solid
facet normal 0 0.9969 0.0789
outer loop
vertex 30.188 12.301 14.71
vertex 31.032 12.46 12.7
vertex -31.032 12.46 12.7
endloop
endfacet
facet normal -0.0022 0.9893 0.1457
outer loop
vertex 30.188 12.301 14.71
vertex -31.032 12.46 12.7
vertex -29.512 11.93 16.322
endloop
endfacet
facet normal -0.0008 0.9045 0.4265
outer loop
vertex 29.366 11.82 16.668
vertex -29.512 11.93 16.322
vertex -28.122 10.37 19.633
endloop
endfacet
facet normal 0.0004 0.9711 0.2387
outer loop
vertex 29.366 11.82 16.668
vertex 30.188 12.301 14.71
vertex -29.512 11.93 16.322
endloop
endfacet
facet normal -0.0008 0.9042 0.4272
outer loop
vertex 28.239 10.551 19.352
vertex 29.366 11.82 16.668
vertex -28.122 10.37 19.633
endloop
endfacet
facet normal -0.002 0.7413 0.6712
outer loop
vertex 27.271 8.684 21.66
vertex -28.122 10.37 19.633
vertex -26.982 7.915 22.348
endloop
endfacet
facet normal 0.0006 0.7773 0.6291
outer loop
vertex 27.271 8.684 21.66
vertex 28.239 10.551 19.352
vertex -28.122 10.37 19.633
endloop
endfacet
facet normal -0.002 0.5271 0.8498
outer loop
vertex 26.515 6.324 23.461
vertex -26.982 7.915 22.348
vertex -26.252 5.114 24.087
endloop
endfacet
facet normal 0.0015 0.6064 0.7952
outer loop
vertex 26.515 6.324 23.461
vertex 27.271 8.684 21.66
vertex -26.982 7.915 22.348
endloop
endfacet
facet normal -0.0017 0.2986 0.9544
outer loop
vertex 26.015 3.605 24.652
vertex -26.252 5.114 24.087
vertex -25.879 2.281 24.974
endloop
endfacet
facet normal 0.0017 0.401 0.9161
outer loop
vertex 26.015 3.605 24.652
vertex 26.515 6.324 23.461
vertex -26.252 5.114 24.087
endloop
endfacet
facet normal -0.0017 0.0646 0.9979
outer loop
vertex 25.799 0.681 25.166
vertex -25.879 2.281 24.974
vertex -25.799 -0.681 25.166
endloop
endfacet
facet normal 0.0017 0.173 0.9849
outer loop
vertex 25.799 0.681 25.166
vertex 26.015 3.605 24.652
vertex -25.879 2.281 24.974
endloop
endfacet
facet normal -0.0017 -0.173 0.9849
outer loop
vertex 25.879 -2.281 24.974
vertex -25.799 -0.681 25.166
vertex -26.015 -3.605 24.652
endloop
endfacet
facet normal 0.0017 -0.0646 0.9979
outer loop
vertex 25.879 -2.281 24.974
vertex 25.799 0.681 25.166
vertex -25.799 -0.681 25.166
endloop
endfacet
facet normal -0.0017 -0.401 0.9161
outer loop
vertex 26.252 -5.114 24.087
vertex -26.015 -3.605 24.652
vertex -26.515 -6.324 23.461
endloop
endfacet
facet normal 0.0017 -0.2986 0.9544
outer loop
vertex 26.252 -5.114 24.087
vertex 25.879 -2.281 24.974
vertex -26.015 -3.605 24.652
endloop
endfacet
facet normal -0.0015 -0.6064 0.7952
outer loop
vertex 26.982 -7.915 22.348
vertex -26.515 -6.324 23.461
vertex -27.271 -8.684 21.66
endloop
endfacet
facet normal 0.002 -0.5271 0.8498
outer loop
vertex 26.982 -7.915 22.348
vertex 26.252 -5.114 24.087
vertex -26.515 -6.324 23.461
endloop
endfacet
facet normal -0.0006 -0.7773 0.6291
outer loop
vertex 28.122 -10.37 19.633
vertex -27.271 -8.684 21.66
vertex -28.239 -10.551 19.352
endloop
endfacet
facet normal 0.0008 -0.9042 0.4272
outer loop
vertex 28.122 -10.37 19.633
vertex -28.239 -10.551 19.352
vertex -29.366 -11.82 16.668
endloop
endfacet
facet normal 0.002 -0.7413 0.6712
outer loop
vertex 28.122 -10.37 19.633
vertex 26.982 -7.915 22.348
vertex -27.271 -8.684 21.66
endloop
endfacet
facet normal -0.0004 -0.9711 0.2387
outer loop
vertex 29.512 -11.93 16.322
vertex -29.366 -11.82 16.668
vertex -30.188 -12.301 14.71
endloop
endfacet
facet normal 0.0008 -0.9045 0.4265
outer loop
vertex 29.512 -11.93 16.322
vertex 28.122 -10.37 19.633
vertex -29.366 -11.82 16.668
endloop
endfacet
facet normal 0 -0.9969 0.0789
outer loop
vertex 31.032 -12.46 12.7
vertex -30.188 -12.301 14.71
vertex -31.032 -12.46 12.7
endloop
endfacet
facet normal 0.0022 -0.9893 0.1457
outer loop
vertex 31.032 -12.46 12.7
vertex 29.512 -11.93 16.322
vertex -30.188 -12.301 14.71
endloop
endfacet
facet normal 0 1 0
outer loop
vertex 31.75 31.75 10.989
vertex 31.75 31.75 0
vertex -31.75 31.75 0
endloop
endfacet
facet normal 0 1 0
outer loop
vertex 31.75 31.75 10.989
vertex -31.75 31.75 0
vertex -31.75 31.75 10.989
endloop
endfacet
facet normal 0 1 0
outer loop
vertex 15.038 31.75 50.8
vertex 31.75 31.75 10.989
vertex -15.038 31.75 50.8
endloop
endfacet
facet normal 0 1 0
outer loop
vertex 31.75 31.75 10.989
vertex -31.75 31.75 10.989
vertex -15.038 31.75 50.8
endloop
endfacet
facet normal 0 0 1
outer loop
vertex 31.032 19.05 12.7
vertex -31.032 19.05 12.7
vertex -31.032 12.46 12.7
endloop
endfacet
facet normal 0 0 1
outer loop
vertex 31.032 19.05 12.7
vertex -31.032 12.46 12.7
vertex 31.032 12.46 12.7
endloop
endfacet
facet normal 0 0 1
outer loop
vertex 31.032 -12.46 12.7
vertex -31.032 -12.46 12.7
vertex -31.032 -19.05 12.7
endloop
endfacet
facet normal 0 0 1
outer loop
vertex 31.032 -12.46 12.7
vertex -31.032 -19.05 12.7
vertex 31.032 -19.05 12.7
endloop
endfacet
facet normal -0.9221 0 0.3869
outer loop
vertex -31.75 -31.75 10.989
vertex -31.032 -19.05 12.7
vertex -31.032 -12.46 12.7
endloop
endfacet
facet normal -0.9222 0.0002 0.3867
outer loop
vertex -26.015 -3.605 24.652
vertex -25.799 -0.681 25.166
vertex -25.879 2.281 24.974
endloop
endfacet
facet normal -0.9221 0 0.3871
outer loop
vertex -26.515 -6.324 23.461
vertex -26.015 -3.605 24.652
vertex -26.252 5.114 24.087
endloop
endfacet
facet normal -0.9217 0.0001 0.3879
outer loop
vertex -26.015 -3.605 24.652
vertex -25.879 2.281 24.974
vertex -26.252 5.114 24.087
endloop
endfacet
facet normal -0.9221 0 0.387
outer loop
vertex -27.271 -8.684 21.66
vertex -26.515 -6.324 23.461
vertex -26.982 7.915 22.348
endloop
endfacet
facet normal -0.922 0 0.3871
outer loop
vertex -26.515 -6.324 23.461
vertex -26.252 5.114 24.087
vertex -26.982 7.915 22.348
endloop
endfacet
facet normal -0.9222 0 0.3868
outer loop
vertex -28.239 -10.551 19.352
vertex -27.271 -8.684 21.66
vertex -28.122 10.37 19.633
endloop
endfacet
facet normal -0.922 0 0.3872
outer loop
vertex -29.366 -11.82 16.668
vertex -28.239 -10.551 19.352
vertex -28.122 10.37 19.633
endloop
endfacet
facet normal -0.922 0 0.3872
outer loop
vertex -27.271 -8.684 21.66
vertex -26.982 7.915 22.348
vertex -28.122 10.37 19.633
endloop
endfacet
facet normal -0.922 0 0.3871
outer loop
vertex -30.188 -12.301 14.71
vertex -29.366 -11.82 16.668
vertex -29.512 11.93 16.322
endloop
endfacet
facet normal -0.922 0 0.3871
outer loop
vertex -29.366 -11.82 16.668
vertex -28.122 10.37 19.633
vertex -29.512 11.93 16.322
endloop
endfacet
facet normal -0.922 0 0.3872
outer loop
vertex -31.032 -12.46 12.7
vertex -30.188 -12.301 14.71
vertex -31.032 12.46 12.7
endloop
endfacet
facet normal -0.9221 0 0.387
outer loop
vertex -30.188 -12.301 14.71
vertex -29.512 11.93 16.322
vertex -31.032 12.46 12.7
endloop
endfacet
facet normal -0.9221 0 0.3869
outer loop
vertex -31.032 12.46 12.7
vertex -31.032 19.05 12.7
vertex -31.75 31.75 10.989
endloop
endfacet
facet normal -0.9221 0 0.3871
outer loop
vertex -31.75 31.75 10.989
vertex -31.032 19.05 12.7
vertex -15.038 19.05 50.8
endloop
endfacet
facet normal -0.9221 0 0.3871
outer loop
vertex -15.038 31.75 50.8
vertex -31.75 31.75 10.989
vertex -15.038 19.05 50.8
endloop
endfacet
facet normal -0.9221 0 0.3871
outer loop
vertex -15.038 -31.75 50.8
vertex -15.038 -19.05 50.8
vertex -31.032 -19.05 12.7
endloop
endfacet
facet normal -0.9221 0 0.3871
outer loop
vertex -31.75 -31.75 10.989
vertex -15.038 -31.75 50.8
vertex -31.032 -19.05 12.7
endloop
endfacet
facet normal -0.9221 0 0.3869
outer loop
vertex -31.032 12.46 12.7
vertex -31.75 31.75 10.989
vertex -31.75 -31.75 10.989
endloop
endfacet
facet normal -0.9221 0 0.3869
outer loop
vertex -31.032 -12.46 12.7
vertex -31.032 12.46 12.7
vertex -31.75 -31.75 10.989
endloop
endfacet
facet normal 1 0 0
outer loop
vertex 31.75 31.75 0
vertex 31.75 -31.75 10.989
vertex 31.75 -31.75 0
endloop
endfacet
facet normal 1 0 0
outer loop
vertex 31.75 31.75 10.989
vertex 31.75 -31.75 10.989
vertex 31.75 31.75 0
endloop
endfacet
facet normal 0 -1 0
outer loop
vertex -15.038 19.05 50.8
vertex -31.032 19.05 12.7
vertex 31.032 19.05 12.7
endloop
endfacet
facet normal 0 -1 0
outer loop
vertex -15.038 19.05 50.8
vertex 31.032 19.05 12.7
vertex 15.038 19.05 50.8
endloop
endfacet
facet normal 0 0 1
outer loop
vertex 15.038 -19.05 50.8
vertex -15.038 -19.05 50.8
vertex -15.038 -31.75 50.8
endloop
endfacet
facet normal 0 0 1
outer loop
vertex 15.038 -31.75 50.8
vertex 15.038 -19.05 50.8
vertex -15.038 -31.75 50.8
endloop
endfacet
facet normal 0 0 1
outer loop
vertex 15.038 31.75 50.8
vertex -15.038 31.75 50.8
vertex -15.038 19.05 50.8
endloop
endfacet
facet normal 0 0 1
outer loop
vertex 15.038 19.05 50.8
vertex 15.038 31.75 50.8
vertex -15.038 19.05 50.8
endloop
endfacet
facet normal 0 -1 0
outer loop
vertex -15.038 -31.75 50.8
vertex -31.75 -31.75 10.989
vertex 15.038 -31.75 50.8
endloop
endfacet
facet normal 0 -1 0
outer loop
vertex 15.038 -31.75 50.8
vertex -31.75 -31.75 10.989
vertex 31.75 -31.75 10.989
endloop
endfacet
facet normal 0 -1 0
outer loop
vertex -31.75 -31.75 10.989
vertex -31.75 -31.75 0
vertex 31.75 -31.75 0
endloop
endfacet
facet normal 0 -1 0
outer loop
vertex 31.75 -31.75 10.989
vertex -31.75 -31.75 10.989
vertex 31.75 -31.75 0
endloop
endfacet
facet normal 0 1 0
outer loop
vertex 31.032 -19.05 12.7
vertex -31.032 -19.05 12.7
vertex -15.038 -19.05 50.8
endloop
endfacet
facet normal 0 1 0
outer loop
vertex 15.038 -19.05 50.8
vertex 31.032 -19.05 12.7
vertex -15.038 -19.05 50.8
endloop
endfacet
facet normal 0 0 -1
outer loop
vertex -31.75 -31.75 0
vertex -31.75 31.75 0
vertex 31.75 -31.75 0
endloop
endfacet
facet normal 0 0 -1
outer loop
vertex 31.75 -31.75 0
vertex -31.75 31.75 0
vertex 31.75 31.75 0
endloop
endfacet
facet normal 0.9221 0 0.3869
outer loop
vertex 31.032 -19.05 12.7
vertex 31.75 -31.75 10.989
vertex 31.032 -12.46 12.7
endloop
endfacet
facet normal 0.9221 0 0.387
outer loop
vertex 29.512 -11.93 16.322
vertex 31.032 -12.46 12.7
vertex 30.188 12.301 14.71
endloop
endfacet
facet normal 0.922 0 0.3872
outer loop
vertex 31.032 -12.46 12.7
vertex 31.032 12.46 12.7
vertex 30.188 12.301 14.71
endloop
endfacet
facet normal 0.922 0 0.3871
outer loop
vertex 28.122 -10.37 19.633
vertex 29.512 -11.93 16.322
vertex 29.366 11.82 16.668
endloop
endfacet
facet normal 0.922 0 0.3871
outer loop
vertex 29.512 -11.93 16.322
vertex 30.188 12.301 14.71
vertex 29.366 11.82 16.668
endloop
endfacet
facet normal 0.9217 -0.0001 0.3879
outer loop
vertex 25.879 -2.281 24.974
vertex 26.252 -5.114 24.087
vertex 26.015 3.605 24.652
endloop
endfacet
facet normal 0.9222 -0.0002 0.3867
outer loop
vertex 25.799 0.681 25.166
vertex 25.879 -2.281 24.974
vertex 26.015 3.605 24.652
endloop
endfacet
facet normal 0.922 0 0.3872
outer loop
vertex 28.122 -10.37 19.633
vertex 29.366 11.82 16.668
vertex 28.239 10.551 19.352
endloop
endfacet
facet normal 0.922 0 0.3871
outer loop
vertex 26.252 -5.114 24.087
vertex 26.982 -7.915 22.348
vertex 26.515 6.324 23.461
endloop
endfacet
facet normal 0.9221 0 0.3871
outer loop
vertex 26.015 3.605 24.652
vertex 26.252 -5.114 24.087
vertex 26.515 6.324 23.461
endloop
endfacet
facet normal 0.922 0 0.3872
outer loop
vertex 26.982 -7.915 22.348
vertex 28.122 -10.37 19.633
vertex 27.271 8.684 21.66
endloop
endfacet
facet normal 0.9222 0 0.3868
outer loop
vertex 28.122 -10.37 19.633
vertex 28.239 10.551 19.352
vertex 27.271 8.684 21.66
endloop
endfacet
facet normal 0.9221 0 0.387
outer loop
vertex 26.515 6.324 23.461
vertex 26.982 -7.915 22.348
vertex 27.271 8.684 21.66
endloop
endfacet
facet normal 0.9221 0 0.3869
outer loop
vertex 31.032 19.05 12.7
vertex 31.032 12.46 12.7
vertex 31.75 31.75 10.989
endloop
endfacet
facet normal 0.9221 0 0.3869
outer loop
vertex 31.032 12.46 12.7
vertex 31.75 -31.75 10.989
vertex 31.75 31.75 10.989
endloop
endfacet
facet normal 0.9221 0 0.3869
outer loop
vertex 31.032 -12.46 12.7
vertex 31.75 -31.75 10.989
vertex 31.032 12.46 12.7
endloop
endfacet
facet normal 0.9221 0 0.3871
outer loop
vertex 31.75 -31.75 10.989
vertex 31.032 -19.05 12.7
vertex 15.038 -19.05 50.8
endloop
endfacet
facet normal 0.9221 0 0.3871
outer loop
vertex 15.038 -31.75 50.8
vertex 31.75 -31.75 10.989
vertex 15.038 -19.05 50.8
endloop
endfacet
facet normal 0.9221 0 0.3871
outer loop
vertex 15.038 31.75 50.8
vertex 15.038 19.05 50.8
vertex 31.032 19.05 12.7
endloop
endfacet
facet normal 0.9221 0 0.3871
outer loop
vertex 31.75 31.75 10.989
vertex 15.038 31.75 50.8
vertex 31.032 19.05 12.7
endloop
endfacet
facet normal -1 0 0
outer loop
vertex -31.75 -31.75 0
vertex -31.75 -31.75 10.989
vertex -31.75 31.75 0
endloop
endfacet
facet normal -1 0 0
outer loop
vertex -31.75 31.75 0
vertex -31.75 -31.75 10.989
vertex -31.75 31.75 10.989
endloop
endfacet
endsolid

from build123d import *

# Parameters (mm, degrees)
F0_W     = 63.5
F0_H     = 63.5
F1_DEPTH = 12.7
F2_W     = 12.7
F2_H     = 38.1
F3_DEPTH = 63.5
F4_R     = 12.460297
F5_DEPTH = 63.5
F7_DEPTH = 63.5


with BuildPart() as f1:
    # F0 (on Top) → F1 (new body)
    with BuildSketch(Plane.XY):
        Rectangle(F0_W, F0_H)
    extrude(amount=F1_DEPTH)

    # F2 (on face) → F3 (join)
    with BuildSketch(Plane(origin=(-31.75, 0, 0), x_dir=(0, -1, 0), z_dir=(-1, 0, 0))):
        with Locations((-25.4, 31.75)):
            Rectangle(F2_W, F2_H)
        with Locations((25.4, 31.75)):
            Rectangle(F2_W, F2_H)
    extrude(amount=-F3_DEPTH)

    # F4 (on face) → F5 (join)
    with BuildSketch(Plane.YZ.offset(31.75)):
        with Locations((0, 12.724482)):
            Circle(F4_R)
    extrude(amount=-F5_DEPTH)

    # F6 (on face) → F7 (cut)
    with BuildSketch(Plane(origin=(0, 31.75, 0), x_dir=(-1, 0, 0), z_dir=(0, 1, 0))):
        Polygon((-31.75, 50.8), (-31.75, 10.989325), (-15.038024, 50.8), align=None)
        Polygon((15.038024, 50.8), (31.75, 10.989325), (31.75, 50.8), align=None)
    extrude(amount=-F7_DEPTH, mode=Mode.SUBTRACT)


solid = f1.part
